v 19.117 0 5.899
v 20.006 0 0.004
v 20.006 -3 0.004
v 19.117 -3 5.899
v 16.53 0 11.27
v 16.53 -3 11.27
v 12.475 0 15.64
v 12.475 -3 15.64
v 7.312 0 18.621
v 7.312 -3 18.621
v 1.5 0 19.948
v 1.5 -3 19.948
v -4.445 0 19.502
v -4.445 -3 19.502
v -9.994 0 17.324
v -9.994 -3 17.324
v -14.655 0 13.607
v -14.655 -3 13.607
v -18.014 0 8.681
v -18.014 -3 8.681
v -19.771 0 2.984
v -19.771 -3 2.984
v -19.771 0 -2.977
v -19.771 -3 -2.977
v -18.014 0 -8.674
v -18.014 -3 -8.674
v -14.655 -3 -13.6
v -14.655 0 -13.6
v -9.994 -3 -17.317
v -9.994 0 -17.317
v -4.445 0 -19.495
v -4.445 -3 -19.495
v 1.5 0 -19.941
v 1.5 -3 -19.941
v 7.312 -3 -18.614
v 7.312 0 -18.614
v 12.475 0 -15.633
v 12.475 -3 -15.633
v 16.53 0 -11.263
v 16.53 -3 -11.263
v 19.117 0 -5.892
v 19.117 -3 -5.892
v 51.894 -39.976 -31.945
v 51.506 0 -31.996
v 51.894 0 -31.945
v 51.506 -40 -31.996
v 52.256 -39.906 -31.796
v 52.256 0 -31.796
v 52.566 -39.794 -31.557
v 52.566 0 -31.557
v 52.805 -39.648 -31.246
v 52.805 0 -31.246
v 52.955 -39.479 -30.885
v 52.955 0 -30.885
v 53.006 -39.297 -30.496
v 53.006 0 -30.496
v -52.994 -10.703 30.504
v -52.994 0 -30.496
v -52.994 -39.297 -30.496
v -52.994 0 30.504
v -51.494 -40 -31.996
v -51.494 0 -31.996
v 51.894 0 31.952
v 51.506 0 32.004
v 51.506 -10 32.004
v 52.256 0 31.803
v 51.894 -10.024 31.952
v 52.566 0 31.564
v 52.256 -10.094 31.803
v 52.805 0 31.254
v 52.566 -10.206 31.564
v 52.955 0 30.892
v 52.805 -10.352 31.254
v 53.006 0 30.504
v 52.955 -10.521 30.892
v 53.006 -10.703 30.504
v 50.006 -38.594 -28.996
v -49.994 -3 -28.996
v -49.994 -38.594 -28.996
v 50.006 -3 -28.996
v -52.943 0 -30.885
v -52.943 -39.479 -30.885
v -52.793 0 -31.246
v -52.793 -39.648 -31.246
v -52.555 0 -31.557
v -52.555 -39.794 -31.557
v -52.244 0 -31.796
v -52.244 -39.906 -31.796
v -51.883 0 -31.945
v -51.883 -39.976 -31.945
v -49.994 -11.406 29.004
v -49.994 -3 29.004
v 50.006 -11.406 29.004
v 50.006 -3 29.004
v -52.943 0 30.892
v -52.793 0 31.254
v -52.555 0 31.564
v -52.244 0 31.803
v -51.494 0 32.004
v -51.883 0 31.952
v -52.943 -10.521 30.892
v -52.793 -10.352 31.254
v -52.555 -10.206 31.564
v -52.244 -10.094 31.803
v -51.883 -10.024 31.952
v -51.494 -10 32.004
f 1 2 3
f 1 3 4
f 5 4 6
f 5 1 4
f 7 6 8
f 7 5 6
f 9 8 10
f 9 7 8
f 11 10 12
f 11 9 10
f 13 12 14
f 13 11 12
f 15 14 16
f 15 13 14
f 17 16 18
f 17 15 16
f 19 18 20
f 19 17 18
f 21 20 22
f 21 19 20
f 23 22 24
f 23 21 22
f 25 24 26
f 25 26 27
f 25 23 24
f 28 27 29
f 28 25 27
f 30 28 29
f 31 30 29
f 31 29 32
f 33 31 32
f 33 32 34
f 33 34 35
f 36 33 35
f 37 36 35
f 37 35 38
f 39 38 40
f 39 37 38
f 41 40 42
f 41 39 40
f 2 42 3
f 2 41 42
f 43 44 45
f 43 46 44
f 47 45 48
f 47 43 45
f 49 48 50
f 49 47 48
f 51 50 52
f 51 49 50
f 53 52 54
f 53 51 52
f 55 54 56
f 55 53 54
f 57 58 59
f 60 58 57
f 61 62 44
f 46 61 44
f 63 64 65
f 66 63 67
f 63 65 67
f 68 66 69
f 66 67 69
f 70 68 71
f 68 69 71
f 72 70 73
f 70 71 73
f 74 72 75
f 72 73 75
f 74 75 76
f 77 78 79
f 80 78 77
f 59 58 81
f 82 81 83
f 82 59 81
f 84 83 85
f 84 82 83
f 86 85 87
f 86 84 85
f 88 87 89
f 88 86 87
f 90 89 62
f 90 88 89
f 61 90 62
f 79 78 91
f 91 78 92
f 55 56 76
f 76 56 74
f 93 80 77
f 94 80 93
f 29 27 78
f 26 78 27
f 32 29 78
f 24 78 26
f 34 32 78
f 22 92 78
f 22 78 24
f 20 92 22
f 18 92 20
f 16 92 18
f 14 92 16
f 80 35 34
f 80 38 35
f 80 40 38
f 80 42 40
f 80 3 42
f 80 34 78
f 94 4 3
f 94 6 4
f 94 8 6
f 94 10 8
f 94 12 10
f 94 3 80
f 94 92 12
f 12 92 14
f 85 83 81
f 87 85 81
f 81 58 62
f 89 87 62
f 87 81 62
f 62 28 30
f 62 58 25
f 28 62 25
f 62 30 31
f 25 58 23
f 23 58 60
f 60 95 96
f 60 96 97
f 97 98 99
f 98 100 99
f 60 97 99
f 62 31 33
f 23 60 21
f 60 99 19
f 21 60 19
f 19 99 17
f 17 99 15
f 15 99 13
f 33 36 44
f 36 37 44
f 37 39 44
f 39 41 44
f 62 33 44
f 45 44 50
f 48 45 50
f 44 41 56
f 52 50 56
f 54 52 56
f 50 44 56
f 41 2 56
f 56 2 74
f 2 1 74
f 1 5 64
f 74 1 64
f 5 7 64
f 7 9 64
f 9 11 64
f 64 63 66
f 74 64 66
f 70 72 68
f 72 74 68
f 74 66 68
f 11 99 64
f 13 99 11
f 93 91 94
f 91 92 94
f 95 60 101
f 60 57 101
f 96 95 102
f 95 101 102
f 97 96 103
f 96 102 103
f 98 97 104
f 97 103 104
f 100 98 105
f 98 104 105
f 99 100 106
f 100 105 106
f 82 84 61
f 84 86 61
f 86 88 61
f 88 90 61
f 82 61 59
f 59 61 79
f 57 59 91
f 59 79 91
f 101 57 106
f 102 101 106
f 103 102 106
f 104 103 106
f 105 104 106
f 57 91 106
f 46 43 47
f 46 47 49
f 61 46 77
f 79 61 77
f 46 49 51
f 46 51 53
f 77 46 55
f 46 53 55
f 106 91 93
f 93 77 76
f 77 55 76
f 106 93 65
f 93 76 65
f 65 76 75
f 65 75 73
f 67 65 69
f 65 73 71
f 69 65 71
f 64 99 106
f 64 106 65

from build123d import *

# Parameters (mm, degrees)
F0_W     = 106
F0_H     = 64
F0_R     = 20
F1_DEPTH = 40
F3_DEPTH = 120
F4_R     = 1.5
F5_T     = -3


with BuildPart() as f1:
    # F0 (on Front) → F1 (new body)
    with BuildSketch(Plane.XZ):
        with Locations((0.0056690624, 0.0035208468)):
            Rectangle(F0_W, F0_H)
        with Locations((0.0056690624, 0.0035208468)):
            Circle(F0_R, mode=Mode.SUBTRACT)
    extrude(amount=F1_DEPTH)

    # F2 (on face) → F3 (cut)
    with BuildSketch(Plane.YZ.offset(53.0056690624)):
        Polygon((-40, 32.0035208468), (-40, -31.9964791532), (-10, 32.0035208468), align=None)
    extrude(amount=-F3_DEPTH, mode=Mode.SUBTRACT)

    # F4
    f4_edges = [f1.edges().sort_by_distance(p)[0] for p in [
        (53.005669, -5, 32.003521),
        (-52.994331, -5, 32.003521),
        (-52.994331, -20, -31.996479),
        (53.005669, -20, -31.996479),
    ]]
    fillet(f4_edges, radius=F4_R)

    # F5
    f5_openings = [f1.faces().sort_by_distance(p)[0] for p in [
        (0.005669, -39.459251, -30.84288),
        (-19.994331, -17.1875, 0.003521),
    ]]
    offset(amount=F5_T, openings=f5_openings)


solid = f1.part
